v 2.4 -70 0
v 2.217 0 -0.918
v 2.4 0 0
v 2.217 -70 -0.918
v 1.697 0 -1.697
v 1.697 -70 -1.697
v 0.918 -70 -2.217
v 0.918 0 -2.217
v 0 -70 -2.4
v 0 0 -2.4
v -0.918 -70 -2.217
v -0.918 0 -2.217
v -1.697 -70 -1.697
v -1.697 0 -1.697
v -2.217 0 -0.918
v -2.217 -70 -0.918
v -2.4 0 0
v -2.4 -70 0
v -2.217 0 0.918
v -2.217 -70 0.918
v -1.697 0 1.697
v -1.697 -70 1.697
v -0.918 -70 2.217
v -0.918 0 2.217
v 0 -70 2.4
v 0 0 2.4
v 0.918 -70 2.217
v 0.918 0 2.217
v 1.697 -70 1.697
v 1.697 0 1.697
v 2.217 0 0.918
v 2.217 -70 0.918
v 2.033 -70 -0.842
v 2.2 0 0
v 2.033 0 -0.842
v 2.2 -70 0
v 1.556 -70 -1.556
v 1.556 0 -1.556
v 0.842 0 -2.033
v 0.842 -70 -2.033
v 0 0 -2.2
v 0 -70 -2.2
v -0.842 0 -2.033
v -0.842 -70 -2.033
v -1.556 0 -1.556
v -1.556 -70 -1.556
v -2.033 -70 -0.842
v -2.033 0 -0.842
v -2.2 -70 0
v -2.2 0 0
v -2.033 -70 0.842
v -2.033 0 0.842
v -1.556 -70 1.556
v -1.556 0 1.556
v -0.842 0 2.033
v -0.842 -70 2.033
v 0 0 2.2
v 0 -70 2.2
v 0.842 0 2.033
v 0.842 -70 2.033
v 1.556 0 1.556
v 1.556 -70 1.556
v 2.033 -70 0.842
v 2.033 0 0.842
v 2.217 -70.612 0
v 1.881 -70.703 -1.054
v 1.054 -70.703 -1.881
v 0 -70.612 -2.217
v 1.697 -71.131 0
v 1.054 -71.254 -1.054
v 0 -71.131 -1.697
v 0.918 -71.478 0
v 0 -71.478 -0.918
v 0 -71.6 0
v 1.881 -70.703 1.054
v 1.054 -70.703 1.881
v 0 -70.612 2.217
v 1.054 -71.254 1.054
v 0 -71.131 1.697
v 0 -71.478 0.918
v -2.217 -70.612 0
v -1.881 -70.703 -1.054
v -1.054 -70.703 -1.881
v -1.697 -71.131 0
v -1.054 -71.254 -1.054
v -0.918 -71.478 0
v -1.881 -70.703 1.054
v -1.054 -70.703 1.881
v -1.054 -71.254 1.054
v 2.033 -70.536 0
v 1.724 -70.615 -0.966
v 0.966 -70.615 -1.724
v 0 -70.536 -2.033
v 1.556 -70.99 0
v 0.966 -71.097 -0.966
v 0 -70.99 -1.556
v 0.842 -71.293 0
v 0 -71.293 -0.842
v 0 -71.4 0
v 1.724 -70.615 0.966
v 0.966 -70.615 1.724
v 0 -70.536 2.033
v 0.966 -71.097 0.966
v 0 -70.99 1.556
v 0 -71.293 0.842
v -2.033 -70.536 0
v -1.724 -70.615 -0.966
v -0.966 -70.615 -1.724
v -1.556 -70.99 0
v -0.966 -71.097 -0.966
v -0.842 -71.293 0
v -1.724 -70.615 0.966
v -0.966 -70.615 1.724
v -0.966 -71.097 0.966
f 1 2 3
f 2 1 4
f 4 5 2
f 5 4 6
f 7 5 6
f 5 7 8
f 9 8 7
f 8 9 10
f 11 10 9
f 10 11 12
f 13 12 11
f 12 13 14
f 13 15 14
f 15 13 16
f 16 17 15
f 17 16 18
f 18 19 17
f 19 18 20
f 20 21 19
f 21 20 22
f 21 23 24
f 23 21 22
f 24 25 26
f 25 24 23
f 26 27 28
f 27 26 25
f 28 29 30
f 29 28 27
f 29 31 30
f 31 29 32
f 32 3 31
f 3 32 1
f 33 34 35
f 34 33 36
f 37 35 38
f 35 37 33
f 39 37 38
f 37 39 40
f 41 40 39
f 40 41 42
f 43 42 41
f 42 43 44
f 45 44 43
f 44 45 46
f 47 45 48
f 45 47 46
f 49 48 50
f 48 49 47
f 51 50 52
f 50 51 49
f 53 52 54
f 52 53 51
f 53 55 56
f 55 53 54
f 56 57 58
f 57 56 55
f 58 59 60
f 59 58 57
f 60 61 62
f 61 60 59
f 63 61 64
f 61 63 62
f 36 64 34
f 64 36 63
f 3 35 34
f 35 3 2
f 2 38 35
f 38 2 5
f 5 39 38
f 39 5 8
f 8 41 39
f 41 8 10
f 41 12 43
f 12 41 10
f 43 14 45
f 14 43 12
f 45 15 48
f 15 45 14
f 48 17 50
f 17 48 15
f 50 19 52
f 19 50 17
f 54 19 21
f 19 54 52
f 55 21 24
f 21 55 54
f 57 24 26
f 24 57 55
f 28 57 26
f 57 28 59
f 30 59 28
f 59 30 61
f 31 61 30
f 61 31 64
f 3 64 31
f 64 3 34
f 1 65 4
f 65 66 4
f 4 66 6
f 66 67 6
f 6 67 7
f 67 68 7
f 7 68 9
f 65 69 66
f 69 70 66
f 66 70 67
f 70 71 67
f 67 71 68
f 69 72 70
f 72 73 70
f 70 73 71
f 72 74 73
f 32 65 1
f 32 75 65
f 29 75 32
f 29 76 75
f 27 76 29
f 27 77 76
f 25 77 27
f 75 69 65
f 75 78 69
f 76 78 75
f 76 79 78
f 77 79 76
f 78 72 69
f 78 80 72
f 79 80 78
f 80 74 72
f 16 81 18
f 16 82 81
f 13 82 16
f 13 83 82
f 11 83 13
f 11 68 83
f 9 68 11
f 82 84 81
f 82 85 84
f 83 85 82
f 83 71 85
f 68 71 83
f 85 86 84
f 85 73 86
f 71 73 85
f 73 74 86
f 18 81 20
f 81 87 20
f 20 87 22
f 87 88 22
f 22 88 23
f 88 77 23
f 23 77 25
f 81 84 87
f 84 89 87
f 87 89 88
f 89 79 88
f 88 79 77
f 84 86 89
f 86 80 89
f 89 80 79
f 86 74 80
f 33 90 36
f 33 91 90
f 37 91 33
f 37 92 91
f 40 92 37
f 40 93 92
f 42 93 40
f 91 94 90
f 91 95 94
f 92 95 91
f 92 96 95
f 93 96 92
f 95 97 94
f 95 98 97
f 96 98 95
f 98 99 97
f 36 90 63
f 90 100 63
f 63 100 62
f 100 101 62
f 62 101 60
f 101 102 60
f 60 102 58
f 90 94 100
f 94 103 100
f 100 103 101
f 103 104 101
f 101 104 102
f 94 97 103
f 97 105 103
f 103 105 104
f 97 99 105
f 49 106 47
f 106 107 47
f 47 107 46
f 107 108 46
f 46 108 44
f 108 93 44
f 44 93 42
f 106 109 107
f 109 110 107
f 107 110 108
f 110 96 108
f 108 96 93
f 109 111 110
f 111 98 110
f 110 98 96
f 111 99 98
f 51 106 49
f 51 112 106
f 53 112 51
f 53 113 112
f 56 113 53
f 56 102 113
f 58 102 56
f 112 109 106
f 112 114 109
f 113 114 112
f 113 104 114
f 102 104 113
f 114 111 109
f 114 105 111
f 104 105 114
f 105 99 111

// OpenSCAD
// file: ../p/1-8sphe.scad
use <../lib.scad>
function ldraw_lib__1_8sphe() = [
// 0 Sphere 0.125
// 0 Name: 1-8sphe.dat
// 0 Author: James Jessiman
// 0 !LDRAW_ORG Primitive UPDATE 2012-03
// 0 !LICENSE Licensed under CC BY 2.0 and CC BY 4.0 : see CAreadme.txt
// 
// 0 BFC CERTIFY CCW
  [0,"BFC","CERTIFY"],
  [0,"BFC","CCW"],
// 
// 0 !HISTORY 2000-08-01 {Axel Poque} fixes to resolve L3P error messages.
// 0 !HISTORY 2000-08-01 {Manfred Moolhuysen} fixes to resolve L3P error messages.
// 0 !HISTORY 2000-09-30 [PTadmin] Official Update 2000-02
// 0 !HISTORY 2002-03-28 [hafhead] Made BFC compliant
// 0 !HISTORY 2002-04-25 [PTadmin] Official Update 2002-02
// 0 !HISTORY 2007-06-22 [PTadmin] Header formatted for Contributor Agreement
// 0 !HISTORY 2008-07-01 [PTadmin] Official Update 2008-01
// 0 !HISTORY 2010-09-12 [MagFors] Changed winding, removed duplicated cond-line, optimized filesize
// 0 !HISTORY 2010-12-31 [PTadmin] Official Update 2010-03
// 0 !HISTORY 2012-07-01 [tcobbs] Replaced with geometry from LDView
// 0 !HISTORY 2012-12-28 [PTadmin] Official Update 2012-03
// 
// 
// 3 16 1 0 0 0.9239 0.3827 0 0.9239 0 0.3827
  [3,16,1,0,0,0.9239,0.3827,0,0.9239,0,0.3827],
// 3 16 0.9239 0.3827 0 0.7836 0.4393 0.4393 0.9239 0 0.3827
  [3,16,0.9239,0.3827,0,0.7836,0.4393,0.4393,0.9239,0,0.3827],
// 3 16 0.9239 0 0.3827 0.7836 0.4393 0.4393 0.7071 0 0.7071
  [3,16,0.9239,0,0.3827,0.7836,0.4393,0.4393,0.7071,0,0.7071],
// 3 16 0.7836 0.4393 0.4393 0.4393 0.4393 0.7836 0.7071 0 0.7071
  [3,16,0.7836,0.4393,0.4393,0.4393,0.4393,0.7836,0.7071,0,0.7071],
// 3 16 0.7071 0 0.7071 0.4393 0.4393 0.7836 0.3827 0 0.9239
  [3,16,0.7071,0,0.7071,0.4393,0.4393,0.7836,0.3827,0,0.9239],
// 3 16 0.4393 0.4393 0.7836 0 0.3827 0.9239 0.3827 0 0.9239
  [3,16,0.4393,0.4393,0.7836,0,0.3827,0.9239,0.3827,0,0.9239],
// 3 16 0.3827 0 0.9239 0 0.3827 0.9239 0 0 1
  [3,16,0.3827,0,0.9239,0,0.3827,0.9239,0,0,1],
// 3 16 0.9239 0.3827 0 0.7071 0.7071 0 0.7836 0.4393 0.4393
  [3,16,0.9239,0.3827,0,0.7071,0.7071,0,0.7836,0.4393,0.4393],
// 3 16 0.7071 0.7071 0 0.4393 0.7836 0.4393 0.7836 0.4393 0.4393
  [3,16,0.7071,0.7071,0,0.4393,0.7836,0.4393,0.7836,0.4393,0.4393],
// 3 16 0.7836 0.4393 0.4393 0.4393 0.7836 0.4393 0.4393 0.4393 0.7836
  [3,16,0.7836,0.4393,0.4393,0.4393,0.7836,0.4393,0.4393,0.4393,0.7836],
// 3 16 0.4393 0.7836 0.4393 0 0.7071 0.7071 0.4393 0.4393 0.7836
  [3,16,0.4393,0.7836,0.4393,0,0.7071,0.7071,0.4393,0.4393,0.7836],
// 3 16 0.4393 0.4393 0.7836 0 0.7071 0.7071 0 0.3827 0.9239
  [3,16,0.4393,0.4393,0.7836,0,0.7071,0.7071,0,0.3827,0.9239],
// 3 16 0.7071 0.7071 0 0.3827 0.9239 0 0.4393 0.7836 0.4393
  [3,16,0.7071,0.7071,0,0.3827,0.9239,0,0.4393,0.7836,0.4393],
// 3 16 0.3827 0.9239 0 0 0.9239 0.3827 0.4393 0.7836 0.4393
  [3,16,0.3827,0.9239,0,0,0.9239,0.3827,0.4393,0.7836,0.4393],
// 3 16 0.4393 0.7836 0.4393 0 0.9239 0.3827 0 0.7071 0.7071
  [3,16,0.4393,0.7836,0.4393,0,0.9239,0.3827,0,0.7071,0.7071],
// 3 16 0.3827 0.9239 0 0 1 0 0 0.9239 0.3827
  [3,16,0.3827,0.9239,0,0,1,0,0,0.9239,0.3827],
// 
// 5 24 1 0 0 0.9239 0.3827 0 1 0 -0.1 0.9239 0 0.3827
  [5,24,1,0,0,0.9239,0.3827,0,1,0,-0.1,0.9239,0,0.3827],
// 5 24 0.9239 0.3827 0 0.9239 0 0.3827 1 0 0 0.7836 0.4393 0.4393
  [5,24,0.9239,0.3827,0,0.9239,0,0.3827,1,0,0,0.7836,0.4393,0.4393],
// 5 24 1 0 0 0.9239 0 0.3827 0.9239 0.3827 0 1 -0.1 0
  [5,24,1,0,0,0.9239,0,0.3827,0.9239,0.3827,0,1,-0.1,0],
// 5 24 0.9239 0 0.3827 0.7836 0.4393 0.4393 0.9239 0.3827 0 0.7071 0 0.7071
  [5,24,0.9239,0,0.3827,0.7836,0.4393,0.4393,0.9239,0.3827,0,0.7071,0,0.7071],
// 5 24 0.7836 0.4393 0.4393 0.7071 0 0.7071 0.9239 0 0.3827 0.4393 0.4393 0.7836
  [5,24,0.7836,0.4393,0.4393,0.7071,0,0.7071,0.9239,0,0.3827,0.4393,0.4393,0.7836],
// 5 24 0.9239 0 0.3827 0.7071 0 0.7071 0.7836 0.4393 0.4393 0.9239 -0.1 0.3827
  [5,24,0.9239,0,0.3827,0.7071,0,0.7071,0.7836,0.4393,0.4393,0.9239,-0.1,0.3827],
// 5 24 0.7071 0 0.7071 0.4393 0.4393 0.7836 0.7836 0.4393 0.4393 0.3827 0 0.9239
  [5,24,0.7071,0,0.7071,0.4393,0.4393,0.7836,0.7836,0.4393,0.4393,0.3827,0,0.9239],
// 5 24 0.4393 0.4393 0.7836 0.3827 0 0.9239 0.7071 0 0.7071 0 0.3827 0.9239
  [5,24,0.4393,0.4393,0.7836,0.3827,0,0.9239,0.7071,0,0.7071,0,0.3827,0.9239],
// 5 24 0.7071 0 0.7071 0.3827 0 0.9239 0.4393 0.4393 0.7836 0.7071 -0.1 0.7071
  [5,24,0.7071,0,0.7071,0.3827,0,0.9239,0.4393,0.4393,0.7836,0.7071,-0.1,0.7071],
// 5 24 0.3827 0 0.9239 0 0.3827 0.9239 0.4393 0.4393 0.7836 0 0 1
  [5,24,0.3827,0,0.9239,0,0.3827,0.9239,0.4393,0.4393,0.7836,0,0,1],
// 5 24 0 0.3827 0.9239 0 0 1 0.3827 0 0.9239 -0.1 0.3827 0.9239
  [5,24,0,0.3827,0.9239,0,0,1,0.3827,0,0.9239,-0.1,0.3827,0.9239],
// 5 24 0.3827 0 0.9239 0 0 1 0 0.3827 0.9239 0.3827 -0.1 0.9239
  [5,24,0.3827,0,0.9239,0,0,1,0,0.3827,0.9239,0.3827,-0.1,0.9239],
// 5 24 0.9239 0.3827 0 0.7071 0.7071 0 0.9239 0.3827 -0.1 0.7836 0.4393 0.4393
  [5,24,0.9239,0.3827,0,0.7071,0.7071,0,0.9239,0.3827,-0.1,0.7836,0.4393,0.4393],
// 5 24 0.7071 0.7071 0 0.7836 0.4393 0.4393 0.9239 0.3827 0 0.4393 0.7836 0.4393
  [5,24,0.7071,0.7071,0,0.7836,0.4393,0.4393,0.9239,0.3827,0,0.4393,0.7836,0.4393],
// 5 24 0.9239 0.3827 0 0.7836 0.4393 0.4393 0.7071 0.7071 0 0.9239 0 0.3827
  [5,24,0.9239,0.3827,0,0.7836,0.4393,0.4393,0.7071,0.7071,0,0.9239,0,0.3827],
// 5 24 0.7836 0.4393 0.4393 0.4393 0.7836 0.4393 0.7071 0.7071 0 0.4393 0.4393 0.7836
  [5,24,0.7836,0.4393,0.4393,0.4393,0.7836,0.4393,0.7071,0.7071,0,0.4393,0.4393,0.7836],
// 5 24 0.4393 0.7836 0.4393 0.4393 0.4393 0.7836 0.7836 0.4393 0.4393 0 0.7071 0.7071
  [5,24,0.4393,0.7836,0.4393,0.4393,0.4393,0.7836,0.7836,0.4393,0.4393,0,0.7071,0.7071],
// 5 24 0.7836 0.4393 0.4393 0.4393 0.4393 0.7836 0.4393 0.7836 0.4393 0.7071 0 0.7071
  [5,24,0.7836,0.4393,0.4393,0.4393,0.4393,0.7836,0.4393,0.7836,0.4393,0.7071,0,0.7071],
// 5 24 0.4393 0.4393 0.7836 0 0.7071 0.7071 0.4393 0.7836 0.4393 0 0.3827 0.9239
  [5,24,0.4393,0.4393,0.7836,0,0.7071,0.7071,0.4393,0.7836,0.4393,0,0.3827,0.9239],
// 5 24 0 0.7071 0.7071 0 0.3827 0.9239 0.4393 0.4393 0.7836 -0.1 0.7071 0.7071
  [5,24,0,0.7071,0.7071,0,0.3827,0.9239,0.4393,0.4393,0.7836,-0.1,0.7071,0.7071],
// 5 24 0.4393 0.4393 0.7836 0 0.3827 0.9239 0 0.7071 0.7071 0.3827 0 0.9239
  [5,24,0.4393,0.4393,0.7836,0,0.3827,0.9239,0,0.7071,0.7071,0.3827,0,0.9239],
// 5 24 0.7071 0.7071 0 0.3827 0.9239 0 0.7071 0.7071 -0.1 0.4393 0.7836 0.4393
  [5,24,0.7071,0.7071,0,0.3827,0.9239,0,0.7071,0.7071,-0.1,0.4393,0.7836,0.4393],
// 5 24 0.3827 0.9239 0 0.4393 0.7836 0.4393 0.7071 0.7071 0 0 0.9239 0.3827
  [5,24,0.3827,0.9239,0,0.4393,0.7836,0.4393,0.7071,0.7071,0,0,0.9239,0.3827],
// 5 24 0.7071 0.7071 0 0.4393 0.7836 0.4393 0.3827 0.9239 0 0.7836 0.4393 0.4393
  [5,24,0.7071,0.7071,0,0.4393,0.7836,0.4393,0.3827,0.9239,0,0.7836,0.4393,0.4393],
// 5 24 0.4393 0.7836 0.4393 0 0.9239 0.3827 0.3827 0.9239 0 0 0.7071 0.7071
  [5,24,0.4393,0.7836,0.4393,0,0.9239,0.3827,0.3827,0.9239,0,0,0.7071,0.7071],
// 5 24 0 0.9239 0.3827 0 0.7071 0.7071 0.4393 0.7836 0.4393 -0.1 0.9239 0.3827
  [5,24,0,0.9239,0.3827,0,0.7071,0.7071,0.4393,0.7836,0.4393,-0.1,0.9239,0.3827],
// 5 24 0.4393 0.7836 0.4393 0 0.7071 0.7071 0 0.9239 0.3827 0.4393 0.4393 0.7836
  [5,24,0.4393,0.7836,0.4393,0,0.7071,0.7071,0,0.9239,0.3827,0.4393,0.4393,0.7836],
// 5 24 0.3827 0.9239 0 0 1 0 0.3827 0.9239 -0.1 0 0.9239 0.3827
  [5,24,0.3827,0.9239,0,0,1,0,0.3827,0.9239,-0.1,0,0.9239,0.3827],
// 5 24 0 1 0 0 0.9239 0.3827 0.3827 0.9239 0 -0.1 1 0
  [5,24,0,1,0,0,0.9239,0.3827,0.3827,0.9239,0,-0.1,1,0],
// 5 24 0.3827 0.9239 0 0 0.9239 0.3827 0 1 0 0.4393 0.7836 0.4393
  [5,24,0.3827,0.9239,0,0,0.9239,0.3827,0,1,0,0.4393,0.7836,0.4393],
];
module ldraw_lib__1_8sphe(step=0, col=false, unit=2/5, alt=false, line=0.2, solid=!$preview)
    makepoly(ldraw_lib__1_8sphe(), step=step, col=col, unit=unit, alt=alt, line=line, solid=solid);
ldraw_lib__1_8sphe(line=0.2);
// file: ../p/4-8sphe.scad
use <../lib.scad>
use <1-8sphe.scad>
function ldraw_lib__4_8sphe() = [
// 0 Sphere 0.5
// 0 Name: 4-8sphe.dat
// 0 Author: James Jessiman
// 0 !LDRAW_ORG Primitive UPDATE 2003-02
// 0 !LICENSE Licensed under CC BY 2.0 and CC BY 4.0 : see CAreadme.txt
// 
// 0 BFC CERTIFY CCW
  [0,"BFC","CERTIFY"],
  [0,"BFC","CCW"],
// 
// 0 !HISTORY 2002-08-31 [izanette] Modified with WINDZ for BFC compliance
// 0 !HISTORY 2003-08-01 [PTadmin] Official Update 2003-02
// 0 !HISTORY 2007-06-24 [PTadmin] Header formatted for Contributor Agreement
// 0 !HISTORY 2008-07-01 [PTadmin] Official Update 2008-01
// 
// 
// 1 16 0 0 0 1 0 0 0 1 0 0 0 1 1-8sphe.dat
  [1,16,0,0,0,1,0,0,0,1,0,0,0,1, ldraw_lib__1_8sphe()],
// 1 16 0 0 0 1 0 0 0 1 0 0 0 -1 1-8sphe.dat
  [1,16,0,0,0,1,0,0,0,1,0,0,0,-1, ldraw_lib__1_8sphe()],
// 1 16 0 0 0 -1 0 0 0 1 0 0 0 1 1-8sphe.dat
  [1,16,0,0,0,-1,0,0,0,1,0,0,0,1, ldraw_lib__1_8sphe()],
// 1 16 0 0 0 -1 0 0 0 1 0 0 0 -1 1-8sphe.dat
  [1,16,0,0,0,-1,0,0,0,1,0,0,0,-1, ldraw_lib__1_8sphe()],
// 0
// 
];
module ldraw_lib__4_8sphe(step=0, col=false, unit=2/5, alt=false, line=0.2, solid=!$preview)
    makepoly(ldraw_lib__4_8sphe(), step=step, col=col, unit=unit, alt=alt, line=line, solid=solid);
ldraw_lib__4_8sphe(line=0.2);
// file: ../p/4-4rin11.scad
use <../lib.scad>
function ldraw_lib__4_4rin11() = [
// 0 Ring 11 x 1.0
// 0 Name: 4-4rin11.dat
// 0 Author: John Riley [jriley]
// 0 !LDRAW_ORG Primitive UPDATE 2003-03
// 0 !LICENSE Licensed under CC BY 2.0 and CC BY 4.0 : see CAreadme.txt
// 
// 0 BFC CERTIFY CCW
  [0,"BFC","CERTIFY"],
  [0,"BFC","CCW"],
// 
// 0 !HISTORY 2003-12-19 [PTadmin] Official Update 2003-03
// 0 !HISTORY 2007-06-24 [PTadmin] Header formatted for Contributor Agreement
// 0 !HISTORY 2008-07-01 [PTadmin] Official Update 2008-01
// 
// 
// 4 16 11 0 0 12 0 0 11.0868 0 4.5924 10.1629 0 4.2097
  [4,16,11,0,0,12,0,0,11.0868,0,4.5924,10.1629,0,4.2097],
// 4 16 10.1629 0 4.2097 11.0868 0 4.5924 8.4852 0 8.4852 7.7781 0 7.7781
  [4,16,10.1629,0,4.2097,11.0868,0,4.5924,8.4852,0,8.4852,7.7781,0,7.7781],
// 4 16 7.7781 0 7.7781 8.4852 0 8.4852 4.5924 0 11.0868 4.2097 0 10.1629
  [4,16,7.7781,0,7.7781,8.4852,0,8.4852,4.5924,0,11.0868,4.2097,0,10.1629],
// 4 16 4.2097 0 10.1629 4.5924 0 11.0868 0 0 12 0 0 11
  [4,16,4.2097,0,10.1629,4.5924,0,11.0868,0,0,12,0,0,11],
// 4 16 0 0 11 0 0 12 -4.5924 0 11.0868 -4.2097 0 10.1629
  [4,16,0,0,11,0,0,12,-4.5924,0,11.0868,-4.2097,0,10.1629],
// 4 16 -4.2097 0 10.1629 -4.5924 0 11.0868 -8.4852 0 8.4852 -7.7781 0 7.7781
  [4,16,-4.2097,0,10.1629,-4.5924,0,11.0868,-8.4852,0,8.4852,-7.7781,0,7.7781],
// 4 16 -7.7781 0 7.7781 -8.4852 0 8.4852 -11.0868 0 4.5924 -10.1629 0 4.2097
  [4,16,-7.7781,0,7.7781,-8.4852,0,8.4852,-11.0868,0,4.5924,-10.1629,0,4.2097],
// 4 16 -10.1629 0 4.2097 -11.0868 0 4.5924 -12 0 0 -11 0 0
  [4,16,-10.1629,0,4.2097,-11.0868,0,4.5924,-12,0,0,-11,0,0],
// 4 16 -11 0 0 -12 0 0 -11.0868 0 -4.5924 -10.1629 0 -4.2097
  [4,16,-11,0,0,-12,0,0,-11.0868,0,-4.5924,-10.1629,0,-4.2097],
// 4 16 -10.1629 0 -4.2097 -11.0868 0 -4.5924 -8.4852 0 -8.4852 -7.7781 0 -7.7781
  [4,16,-10.1629,0,-4.2097,-11.0868,0,-4.5924,-8.4852,0,-8.4852,-7.7781,0,-7.7781],
// 4 16 -7.7781 0 -7.7781 -8.4852 0 -8.4852 -4.5924 0 -11.0868 -4.2097 0 -10.1629
  [4,16,-7.7781,0,-7.7781,-8.4852,0,-8.4852,-4.5924,0,-11.0868,-4.2097,0,-10.1629],
// 4 16 -4.2097 0 -10.1629 -4.5924 0 -11.0868 0 0 -12 0 0 -11
  [4,16,-4.2097,0,-10.1629,-4.5924,0,-11.0868,0,0,-12,0,0,-11],
// 4 16 0 0 -11 0 0 -12 4.5924 0 -11.0868 4.2097 0 -10.1629
  [4,16,0,0,-11,0,0,-12,4.5924,0,-11.0868,4.2097,0,-10.1629],
// 4 16 4.2097 0 -10.1629 4.5924 0 -11.0868 8.4852 0 -8.4852 7.7781 0 -7.7781
  [4,16,4.2097,0,-10.1629,4.5924,0,-11.0868,8.4852,0,-8.4852,7.7781,0,-7.7781],
// 4 16 7.7781 0 -7.7781 8.4852 0 -8.4852 11.0868 0 -4.5924 10.1629 0 -4.2097
  [4,16,7.7781,0,-7.7781,8.4852,0,-8.4852,11.0868,0,-4.5924,10.1629,0,-4.2097],
// 4 16 10.1629 0 -4.2097 11.0868 0 -4.5924 12 0 0 11 0 0
  [4,16,10.1629,0,-4.2097,11.0868,0,-4.5924,12,0,0,11,0,0],
// 0
];
module ldraw_lib__4_4rin11(step=0, col=false, unit=2/5, alt=false, line=0.2, solid=!$preview)
    makepoly(ldraw_lib__4_4rin11(), step=step, col=col, unit=unit, alt=alt, line=line, solid=solid);
ldraw_lib__4_4rin11(line=0.2);
// file: ../p/4-4edge.scad
use <../lib.scad>
function ldraw_lib__4_4edge() = [
// 0 Circle 1.0
// 0 Name: 4-4edge.dat
// 0 Author: James Jessiman
// 0 !LDRAW_ORG Primitive UPDATE 2017-01
// 0 !LICENSE Licensed under CC BY 4.0 : see CAreadme.txt
// 
// 0 BFC CERTIFY CCW
  [0,"BFC","CERTIFY"],
  [0,"BFC","CCW"],
// 
// 0 !HISTORY 1998-12-15 [PTadmin] Official Update 1998-10
// 0 !HISTORY 2005-12-28 [PTadmin] Official Update 2005-01
// 0 !HISTORY 2007-06-24 [PTadmin] Header formatted for Contributor Agreement
// 0 !HISTORY 2008-07-01 [PTadmin] Official Update 2008-01
// 0 !HISTORY 2017-01-15 [Steffen] BFCed
// 0 !HISTORY 2017-12-30 [PTadmin] Official Update 2017-01
// 
// 
// 2 24 1 0 0 0.9239 0 0.3827
  [2,24,1,0,0,0.9239,0,0.3827],
// 2 24 0.9239 0 0.3827 0.7071 0 0.7071
  [2,24,0.9239,0,0.3827,0.7071,0,0.7071],
// 2 24 0.7071 0 0.7071 0.3827 0 0.9239
  [2,24,0.7071,0,0.7071,0.3827,0,0.9239],
// 2 24 0.3827 0 0.9239 0 0 1
  [2,24,0.3827,0,0.9239,0,0,1],
// 2 24 0 0 1 -0.3827 0 0.9239
  [2,24,0,0,1,-0.3827,0,0.9239],
// 2 24 -0.3827 0 0.9239 -0.7071 0 0.7071
  [2,24,-0.3827,0,0.9239,-0.7071,0,0.7071],
// 2 24 -0.7071 0 0.7071 -0.9239 0 0.3827
  [2,24,-0.7071,0,0.7071,-0.9239,0,0.3827],
// 2 24 -0.9239 0 0.3827 -1 0 -0
  [2,24,-0.9239,0,0.3827,-1,0,-0],
// 2 24 -1 0 -0 -0.9239 0 -0.3827
  [2,24,-1,0,-0,-0.9239,0,-0.3827],
// 2 24 -0.9239 0 -0.3827 -0.7071 0 -0.7071
  [2,24,-0.9239,0,-0.3827,-0.7071,0,-0.7071],
// 2 24 -0.7071 0 -0.7071 -0.3827 0 -0.9239
  [2,24,-0.7071,0,-0.7071,-0.3827,0,-0.9239],
// 2 24 -0.3827 0 -0.9239 0 0 -1
  [2,24,-0.3827,0,-0.9239,0,0,-1],
// 2 24 0 0 -1 0.3827 0 -0.9239
  [2,24,0,0,-1,0.3827,0,-0.9239],
// 2 24 0.3827 0 -0.9239 0.7071 0 -0.7071
  [2,24,0.3827,0,-0.9239,0.7071,0,-0.7071],
// 2 24 0.7071 0 -0.7071 0.9239 0 -0.3827
  [2,24,0.7071,0,-0.7071,0.9239,0,-0.3827],
// 2 24 0.9239 0 -0.3827 1 0 0
  [2,24,0.9239,0,-0.3827,1,0,0],
];
module ldraw_lib__4_4edge(step=0, col=false, unit=2/5, alt=false, line=0.2, solid=!$preview)
    makepoly(ldraw_lib__4_4edge(), step=step, col=col, unit=unit, alt=alt, line=line, solid=solid);
ldraw_lib__4_4edge(line=0.2);
// file: ../p/4-4cyli.scad
use <../lib.scad>
function ldraw_lib__4_4cyli() = [
// 0 Cylinder 1.0
// 0 Name: 4-4cyli.dat
// 0 Author: James Jessiman
// 0 !LDRAW_ORG Primitive UPDATE 2005-01
// 0 !LICENSE Licensed under CC BY 2.0 and CC BY 4.0 : see CAreadme.txt
// 
// 0 BFC CERTIFY CCW
  [0,"BFC","CERTIFY"],
  [0,"BFC","CCW"],
// 
// 0 !HISTORY 1998-12-15 [PTadmin] Official Update 1998-10
// 0 !HISTORY 2002-03-23 [sbliss] Added BFC statement; merged headers from files in distributions LDraw 0.27 and Complete.
// 0 !HISTORY 2002-04-25 [PTadmin] Official Update 2002-02
// 0 !HISTORY 2004-12-14 [guyvivan] BFC CCW
// 0 !HISTORY 2005-12-28 [PTadmin] Official Update 2005-01
// 0 !HISTORY 2007-06-24 [PTadmin] Header formatted for Contributor Agreement
// 0 !HISTORY 2008-07-01 [PTadmin] Official Update 2008-01
// 
// 
// 4 16 1 1 0 0.9239 1 0.3827 0.9239 0 0.3827 1 0 0
  [4,16,1,1,0,0.9239,1,0.3827,0.9239,0,0.3827,1,0,0],
// 5 24 1 0 0 1 1 0 0.9239 0 0.3827 0.9239 0 -0.3827
  [5,24,1,0,0,1,1,0,0.9239,0,0.3827,0.9239,0,-0.3827],
// 4 16 0.9239 1 0.3827 0.7071 1 0.7071 0.7071 0 0.7071 0.9239 0 0.3827
  [4,16,0.9239,1,0.3827,0.7071,1,0.7071,0.7071,0,0.7071,0.9239,0,0.3827],
// 5 24 0.9239 0 0.3827 0.9239 1 0.3827 0.7071 0 0.7071 1 0 0
  [5,24,0.9239,0,0.3827,0.9239,1,0.3827,0.7071,0,0.7071,1,0,0],
// 4 16 0.7071 1 0.7071 0.3827 1 0.9239 0.3827 0 0.9239 0.7071 0 0.7071
  [4,16,0.7071,1,0.7071,0.3827,1,0.9239,0.3827,0,0.9239,0.7071,0,0.7071],
// 5 24 0.7071 0 0.7071 0.7071 1 0.7071 0.3827 0 0.9239 0.9239 0 0.3827
  [5,24,0.7071,0,0.7071,0.7071,1,0.7071,0.3827,0,0.9239,0.9239,0,0.3827],
// 4 16 0.3827 1 0.9239 0 1 1 0 0 1 0.3827 0 0.9239
  [4,16,0.3827,1,0.9239,0,1,1,0,0,1,0.3827,0,0.9239],
// 5 24 0.3827 0 0.9239 0.3827 1 0.9239 0 0 1 0.7071 0 0.7071
  [5,24,0.3827,0,0.9239,0.3827,1,0.9239,0,0,1,0.7071,0,0.7071],
// 4 16 0 1 1 -0.3827 1 0.9239 -0.3827 0 0.9239 0 0 1
  [4,16,0,1,1,-0.3827,1,0.9239,-0.3827,0,0.9239,0,0,1],
// 5 24 0 0 1 0 1 1 -0.3827 0 0.9239 0.3827 0 0.9239
  [5,24,0,0,1,0,1,1,-0.3827,0,0.9239,0.3827,0,0.9239],
// 4 16 -0.3827 1 0.9239 -0.7071 1 0.7071 -0.7071 0 0.7071 -0.3827 0 0.9239
  [4,16,-0.3827,1,0.9239,-0.7071,1,0.7071,-0.7071,0,0.7071,-0.3827,0,0.9239],
// 5 24 -0.3827 0 0.9239 -0.3827 1 0.9239 -0.7071 0 0.7071 0 0 1
  [5,24,-0.3827,0,0.9239,-0.3827,1,0.9239,-0.7071,0,0.7071,0,0,1],
// 4 16 -0.7071 1 0.7071 -0.9239 1 0.3827 -0.9239 0 0.3827 -0.7071 0 0.7071
  [4,16,-0.7071,1,0.7071,-0.9239,1,0.3827,-0.9239,0,0.3827,-0.7071,0,0.7071],
// 5 24 -0.7071 0 0.7071 -0.7071 1 0.7071 -0.9239 0 0.3827 -0.3827 0 0.9239
  [5,24,-0.7071,0,0.7071,-0.7071,1,0.7071,-0.9239,0,0.3827,-0.3827,0,0.9239],
// 4 16 -0.9239 1 0.3827 -1 1 0 -1 0 0 -0.9239 0 0.3827
  [4,16,-0.9239,1,0.3827,-1,1,0,-1,0,0,-0.9239,0,0.3827],
// 5 24 -0.9239 0 0.3827 -0.9239 1 0.3827 -1 0 0 -0.7071 0 0.7071
  [5,24,-0.9239,0,0.3827,-0.9239,1,0.3827,-1,0,0,-0.7071,0,0.7071],
// 4 16 -1 1 0 -0.9239 1 -0.3827 -0.9239 0 -0.3827 -1 0 0
  [4,16,-1,1,0,-0.9239,1,-0.3827,-0.9239,0,-0.3827,-1,0,0],
// 5 24 -1 0 0 -1 1 0 -0.9239 0 -0.3827 -0.9239 0 0.3827
  [5,24,-1,0,0,-1,1,0,-0.9239,0,-0.3827,-0.9239,0,0.3827],
// 4 16 -0.9239 1 -0.3827 -0.7071 1 -0.7071 -0.7071 0 -0.7071 -0.9239 0 -0.3827
  [4,16,-0.9239,1,-0.3827,-0.7071,1,-0.7071,-0.7071,0,-0.7071,-0.9239,0,-0.3827],
// 5 24 -0.9239 0 -0.3827 -0.9239 1 -0.3827 -0.7071 0 -0.7071 -1 0 0
  [5,24,-0.9239,0,-0.3827,-0.9239,1,-0.3827,-0.7071,0,-0.7071,-1,0,0],
// 4 16 -0.7071 1 -0.7071 -0.3827 1 -0.9239 -0.3827 0 -0.9239 -0.7071 0 -0.7071
  [4,16,-0.7071,1,-0.7071,-0.3827,1,-0.9239,-0.3827,0,-0.9239,-0.7071,0,-0.7071],
// 5 24 -0.7071 0 -0.7071 -0.7071 1 -0.7071 -0.3827 0 -0.9239 -0.9239 0 -0.3827
  [5,24,-0.7071,0,-0.7071,-0.7071,1,-0.7071,-0.3827,0,-0.9239,-0.9239,0,-0.3827],
// 4 16 -0.3827 1 -0.9239 0 1 -1 0 0 -1 -0.3827 0 -0.9239
  [4,16,-0.3827,1,-0.9239,0,1,-1,0,0,-1,-0.3827,0,-0.9239],
// 5 24 -0.3827 0 -0.9239 -0.3827 1 -0.9239 0 0 -1 -0.7071 0 -0.7071
  [5,24,-0.3827,0,-0.9239,-0.3827,1,-0.9239,0,0,-1,-0.7071,0,-0.7071],
// 4 16 0 1 -1 0.3827 1 -0.9239 0.3827 0 -0.9239 0 0 -1
  [4,16,0,1,-1,0.3827,1,-0.9239,0.3827,0,-0.9239,0,0,-1],
// 5 24 0 0 -1 0 1 -1 0.3827 0 -0.9239 -0.3827 0 -0.9239
  [5,24,0,0,-1,0,1,-1,0.3827,0,-0.9239,-0.3827,0,-0.9239],
// 4 16 0.3827 1 -0.9239 0.7071 1 -0.7071 0.7071 0 -0.7071 0.3827 0 -0.9239
  [4,16,0.3827,1,-0.9239,0.7071,1,-0.7071,0.7071,0,-0.7071,0.3827,0,-0.9239],
// 5 24 0.3827 0 -0.9239 0.3827 1 -0.9239 0.7071 0 -0.7071 0 0 -1
  [5,24,0.3827,0,-0.9239,0.3827,1,-0.9239,0.7071,0,-0.7071,0,0,-1],
// 4 16 0.7071 1 -0.7071 0.9239 1 -0.3827 0.9239 0 -0.3827 0.7071 0 -0.7071
  [4,16,0.7071,1,-0.7071,0.9239,1,-0.3827,0.9239,0,-0.3827,0.7071,0,-0.7071],
// 5 24 0.7071 0 -0.7071 0.7071 1 -0.7071 0.9239 0 -0.3827 0.3827 0 -0.9239
  [5,24,0.7071,0,-0.7071,0.7071,1,-0.7071,0.9239,0,-0.3827,0.3827,0,-0.9239],
// 4 16 0.9239 1 -0.3827 1 1 0 1 0 0 0.9239 0 -0.3827
  [4,16,0.9239,1,-0.3827,1,1,0,1,0,0,0.9239,0,-0.3827],
// 5 24 0.9239 0 -0.3827 0.9239 1 -0.3827 1 0 0 0.7071 0 -0.7071
  [5,24,0.9239,0,-0.3827,0.9239,1,-0.3827,1,0,0,0.7071,0,-0.7071],
// 0
];
module ldraw_lib__4_4cyli(step=0, col=false, unit=2/5, alt=false, line=0.2, solid=!$preview)
    makepoly(ldraw_lib__4_4cyli(), step=step, col=col, unit=unit, alt=alt, line=line, solid=solid);
ldraw_lib__4_4cyli(line=0.2);
// main file
use <../lib.scad>
use <../p/4-4cyli.scad>
use <../p/4-4edge.scad>
use <../p/4-4rin11.scad>
use <../p/4-8sphe.scad>
function ldraw_lib__62836() = [
// 0 ~Electric Mindstorms NXT Temperature Sensor Probe
// 0 Name: 62836.dat
// 0 Author: Philippe Hurbain [Philo]
// 0 !LDRAW_ORG Part UPDATE 2012-01
// 0 !LICENSE Licensed under CC BY 4.0 : see CAreadme.txt
// 
// 0 BFC CERTIFY CCW
  [0,"BFC","CERTIFY"],
  [0,"BFC","CCW"],
// 
// 0 !HISTORY 2012-03-30 [PTadmin] Official Update 2012-01
// 
// 
// 1 16 0 0 0 6 0 0 0 0 6 0 -175 0 4-4cyli.dat
  [1,16,0,0,0,6,0,0,0,0,6,0,-175,0, ldraw_lib__4_4cyli()],
// 0 BFC INVERTNEXT
  [0,"BFC","INVERTNEXT"],
// 1 16 0 0 0 5.5 0 0 0 0 5.5 0 -175 0 4-4cyli.dat
  [1,16,0,0,0,5.5,0,0,0,0,5.5,0,-175,0, ldraw_lib__4_4cyli()],
// 1 16 0 0 0 5.5 0 0 0 0 5.5 0 -175 0 4-4edge.dat
  [1,16,0,0,0,5.5,0,0,0,0,5.5,0,-175,0, ldraw_lib__4_4edge()],
// 1 16 0 0 0 6 0 0 0 0 6 0 -175 0 4-4edge.dat
  [1,16,0,0,0,6,0,0,0,0,6,0,-175,0, ldraw_lib__4_4edge()],
// 1 16 0 0 0 0.5 0 0 0 0 0.5 0 -1 0 4-4rin11.dat
  [1,16,0,0,0,0.5,0,0,0,0,0.5,0,-1,0, ldraw_lib__4_4rin11()],
// 1 16 0 0 -175 6 0 0 0 0 6 0 -4 0 4-8sphe.dat
  [1,16,0,0,-175,6,0,0,0,0,6,0,-4,0, ldraw_lib__4_8sphe()],
// 0 BFC INVERTNEXT
  [0,"BFC","INVERTNEXT"],
// 1 16 0 0 -175 5.5 0 0 0 0 5.5 0 -3.5 0 4-8sphe.dat
  [1,16,0,0,-175,5.5,0,0,0,0,5.5,0,-3.5,0, ldraw_lib__4_8sphe()],
];
module ldraw_lib__62836(step=0, col=false, unit=2/5, alt=false, line=0.2, solid=!$preview)
    makepoly(ldraw_lib__62836(), step=step, col=col, unit=unit, alt=alt, line=line, solid=solid);
ldraw_lib__62836(line=0.2);
